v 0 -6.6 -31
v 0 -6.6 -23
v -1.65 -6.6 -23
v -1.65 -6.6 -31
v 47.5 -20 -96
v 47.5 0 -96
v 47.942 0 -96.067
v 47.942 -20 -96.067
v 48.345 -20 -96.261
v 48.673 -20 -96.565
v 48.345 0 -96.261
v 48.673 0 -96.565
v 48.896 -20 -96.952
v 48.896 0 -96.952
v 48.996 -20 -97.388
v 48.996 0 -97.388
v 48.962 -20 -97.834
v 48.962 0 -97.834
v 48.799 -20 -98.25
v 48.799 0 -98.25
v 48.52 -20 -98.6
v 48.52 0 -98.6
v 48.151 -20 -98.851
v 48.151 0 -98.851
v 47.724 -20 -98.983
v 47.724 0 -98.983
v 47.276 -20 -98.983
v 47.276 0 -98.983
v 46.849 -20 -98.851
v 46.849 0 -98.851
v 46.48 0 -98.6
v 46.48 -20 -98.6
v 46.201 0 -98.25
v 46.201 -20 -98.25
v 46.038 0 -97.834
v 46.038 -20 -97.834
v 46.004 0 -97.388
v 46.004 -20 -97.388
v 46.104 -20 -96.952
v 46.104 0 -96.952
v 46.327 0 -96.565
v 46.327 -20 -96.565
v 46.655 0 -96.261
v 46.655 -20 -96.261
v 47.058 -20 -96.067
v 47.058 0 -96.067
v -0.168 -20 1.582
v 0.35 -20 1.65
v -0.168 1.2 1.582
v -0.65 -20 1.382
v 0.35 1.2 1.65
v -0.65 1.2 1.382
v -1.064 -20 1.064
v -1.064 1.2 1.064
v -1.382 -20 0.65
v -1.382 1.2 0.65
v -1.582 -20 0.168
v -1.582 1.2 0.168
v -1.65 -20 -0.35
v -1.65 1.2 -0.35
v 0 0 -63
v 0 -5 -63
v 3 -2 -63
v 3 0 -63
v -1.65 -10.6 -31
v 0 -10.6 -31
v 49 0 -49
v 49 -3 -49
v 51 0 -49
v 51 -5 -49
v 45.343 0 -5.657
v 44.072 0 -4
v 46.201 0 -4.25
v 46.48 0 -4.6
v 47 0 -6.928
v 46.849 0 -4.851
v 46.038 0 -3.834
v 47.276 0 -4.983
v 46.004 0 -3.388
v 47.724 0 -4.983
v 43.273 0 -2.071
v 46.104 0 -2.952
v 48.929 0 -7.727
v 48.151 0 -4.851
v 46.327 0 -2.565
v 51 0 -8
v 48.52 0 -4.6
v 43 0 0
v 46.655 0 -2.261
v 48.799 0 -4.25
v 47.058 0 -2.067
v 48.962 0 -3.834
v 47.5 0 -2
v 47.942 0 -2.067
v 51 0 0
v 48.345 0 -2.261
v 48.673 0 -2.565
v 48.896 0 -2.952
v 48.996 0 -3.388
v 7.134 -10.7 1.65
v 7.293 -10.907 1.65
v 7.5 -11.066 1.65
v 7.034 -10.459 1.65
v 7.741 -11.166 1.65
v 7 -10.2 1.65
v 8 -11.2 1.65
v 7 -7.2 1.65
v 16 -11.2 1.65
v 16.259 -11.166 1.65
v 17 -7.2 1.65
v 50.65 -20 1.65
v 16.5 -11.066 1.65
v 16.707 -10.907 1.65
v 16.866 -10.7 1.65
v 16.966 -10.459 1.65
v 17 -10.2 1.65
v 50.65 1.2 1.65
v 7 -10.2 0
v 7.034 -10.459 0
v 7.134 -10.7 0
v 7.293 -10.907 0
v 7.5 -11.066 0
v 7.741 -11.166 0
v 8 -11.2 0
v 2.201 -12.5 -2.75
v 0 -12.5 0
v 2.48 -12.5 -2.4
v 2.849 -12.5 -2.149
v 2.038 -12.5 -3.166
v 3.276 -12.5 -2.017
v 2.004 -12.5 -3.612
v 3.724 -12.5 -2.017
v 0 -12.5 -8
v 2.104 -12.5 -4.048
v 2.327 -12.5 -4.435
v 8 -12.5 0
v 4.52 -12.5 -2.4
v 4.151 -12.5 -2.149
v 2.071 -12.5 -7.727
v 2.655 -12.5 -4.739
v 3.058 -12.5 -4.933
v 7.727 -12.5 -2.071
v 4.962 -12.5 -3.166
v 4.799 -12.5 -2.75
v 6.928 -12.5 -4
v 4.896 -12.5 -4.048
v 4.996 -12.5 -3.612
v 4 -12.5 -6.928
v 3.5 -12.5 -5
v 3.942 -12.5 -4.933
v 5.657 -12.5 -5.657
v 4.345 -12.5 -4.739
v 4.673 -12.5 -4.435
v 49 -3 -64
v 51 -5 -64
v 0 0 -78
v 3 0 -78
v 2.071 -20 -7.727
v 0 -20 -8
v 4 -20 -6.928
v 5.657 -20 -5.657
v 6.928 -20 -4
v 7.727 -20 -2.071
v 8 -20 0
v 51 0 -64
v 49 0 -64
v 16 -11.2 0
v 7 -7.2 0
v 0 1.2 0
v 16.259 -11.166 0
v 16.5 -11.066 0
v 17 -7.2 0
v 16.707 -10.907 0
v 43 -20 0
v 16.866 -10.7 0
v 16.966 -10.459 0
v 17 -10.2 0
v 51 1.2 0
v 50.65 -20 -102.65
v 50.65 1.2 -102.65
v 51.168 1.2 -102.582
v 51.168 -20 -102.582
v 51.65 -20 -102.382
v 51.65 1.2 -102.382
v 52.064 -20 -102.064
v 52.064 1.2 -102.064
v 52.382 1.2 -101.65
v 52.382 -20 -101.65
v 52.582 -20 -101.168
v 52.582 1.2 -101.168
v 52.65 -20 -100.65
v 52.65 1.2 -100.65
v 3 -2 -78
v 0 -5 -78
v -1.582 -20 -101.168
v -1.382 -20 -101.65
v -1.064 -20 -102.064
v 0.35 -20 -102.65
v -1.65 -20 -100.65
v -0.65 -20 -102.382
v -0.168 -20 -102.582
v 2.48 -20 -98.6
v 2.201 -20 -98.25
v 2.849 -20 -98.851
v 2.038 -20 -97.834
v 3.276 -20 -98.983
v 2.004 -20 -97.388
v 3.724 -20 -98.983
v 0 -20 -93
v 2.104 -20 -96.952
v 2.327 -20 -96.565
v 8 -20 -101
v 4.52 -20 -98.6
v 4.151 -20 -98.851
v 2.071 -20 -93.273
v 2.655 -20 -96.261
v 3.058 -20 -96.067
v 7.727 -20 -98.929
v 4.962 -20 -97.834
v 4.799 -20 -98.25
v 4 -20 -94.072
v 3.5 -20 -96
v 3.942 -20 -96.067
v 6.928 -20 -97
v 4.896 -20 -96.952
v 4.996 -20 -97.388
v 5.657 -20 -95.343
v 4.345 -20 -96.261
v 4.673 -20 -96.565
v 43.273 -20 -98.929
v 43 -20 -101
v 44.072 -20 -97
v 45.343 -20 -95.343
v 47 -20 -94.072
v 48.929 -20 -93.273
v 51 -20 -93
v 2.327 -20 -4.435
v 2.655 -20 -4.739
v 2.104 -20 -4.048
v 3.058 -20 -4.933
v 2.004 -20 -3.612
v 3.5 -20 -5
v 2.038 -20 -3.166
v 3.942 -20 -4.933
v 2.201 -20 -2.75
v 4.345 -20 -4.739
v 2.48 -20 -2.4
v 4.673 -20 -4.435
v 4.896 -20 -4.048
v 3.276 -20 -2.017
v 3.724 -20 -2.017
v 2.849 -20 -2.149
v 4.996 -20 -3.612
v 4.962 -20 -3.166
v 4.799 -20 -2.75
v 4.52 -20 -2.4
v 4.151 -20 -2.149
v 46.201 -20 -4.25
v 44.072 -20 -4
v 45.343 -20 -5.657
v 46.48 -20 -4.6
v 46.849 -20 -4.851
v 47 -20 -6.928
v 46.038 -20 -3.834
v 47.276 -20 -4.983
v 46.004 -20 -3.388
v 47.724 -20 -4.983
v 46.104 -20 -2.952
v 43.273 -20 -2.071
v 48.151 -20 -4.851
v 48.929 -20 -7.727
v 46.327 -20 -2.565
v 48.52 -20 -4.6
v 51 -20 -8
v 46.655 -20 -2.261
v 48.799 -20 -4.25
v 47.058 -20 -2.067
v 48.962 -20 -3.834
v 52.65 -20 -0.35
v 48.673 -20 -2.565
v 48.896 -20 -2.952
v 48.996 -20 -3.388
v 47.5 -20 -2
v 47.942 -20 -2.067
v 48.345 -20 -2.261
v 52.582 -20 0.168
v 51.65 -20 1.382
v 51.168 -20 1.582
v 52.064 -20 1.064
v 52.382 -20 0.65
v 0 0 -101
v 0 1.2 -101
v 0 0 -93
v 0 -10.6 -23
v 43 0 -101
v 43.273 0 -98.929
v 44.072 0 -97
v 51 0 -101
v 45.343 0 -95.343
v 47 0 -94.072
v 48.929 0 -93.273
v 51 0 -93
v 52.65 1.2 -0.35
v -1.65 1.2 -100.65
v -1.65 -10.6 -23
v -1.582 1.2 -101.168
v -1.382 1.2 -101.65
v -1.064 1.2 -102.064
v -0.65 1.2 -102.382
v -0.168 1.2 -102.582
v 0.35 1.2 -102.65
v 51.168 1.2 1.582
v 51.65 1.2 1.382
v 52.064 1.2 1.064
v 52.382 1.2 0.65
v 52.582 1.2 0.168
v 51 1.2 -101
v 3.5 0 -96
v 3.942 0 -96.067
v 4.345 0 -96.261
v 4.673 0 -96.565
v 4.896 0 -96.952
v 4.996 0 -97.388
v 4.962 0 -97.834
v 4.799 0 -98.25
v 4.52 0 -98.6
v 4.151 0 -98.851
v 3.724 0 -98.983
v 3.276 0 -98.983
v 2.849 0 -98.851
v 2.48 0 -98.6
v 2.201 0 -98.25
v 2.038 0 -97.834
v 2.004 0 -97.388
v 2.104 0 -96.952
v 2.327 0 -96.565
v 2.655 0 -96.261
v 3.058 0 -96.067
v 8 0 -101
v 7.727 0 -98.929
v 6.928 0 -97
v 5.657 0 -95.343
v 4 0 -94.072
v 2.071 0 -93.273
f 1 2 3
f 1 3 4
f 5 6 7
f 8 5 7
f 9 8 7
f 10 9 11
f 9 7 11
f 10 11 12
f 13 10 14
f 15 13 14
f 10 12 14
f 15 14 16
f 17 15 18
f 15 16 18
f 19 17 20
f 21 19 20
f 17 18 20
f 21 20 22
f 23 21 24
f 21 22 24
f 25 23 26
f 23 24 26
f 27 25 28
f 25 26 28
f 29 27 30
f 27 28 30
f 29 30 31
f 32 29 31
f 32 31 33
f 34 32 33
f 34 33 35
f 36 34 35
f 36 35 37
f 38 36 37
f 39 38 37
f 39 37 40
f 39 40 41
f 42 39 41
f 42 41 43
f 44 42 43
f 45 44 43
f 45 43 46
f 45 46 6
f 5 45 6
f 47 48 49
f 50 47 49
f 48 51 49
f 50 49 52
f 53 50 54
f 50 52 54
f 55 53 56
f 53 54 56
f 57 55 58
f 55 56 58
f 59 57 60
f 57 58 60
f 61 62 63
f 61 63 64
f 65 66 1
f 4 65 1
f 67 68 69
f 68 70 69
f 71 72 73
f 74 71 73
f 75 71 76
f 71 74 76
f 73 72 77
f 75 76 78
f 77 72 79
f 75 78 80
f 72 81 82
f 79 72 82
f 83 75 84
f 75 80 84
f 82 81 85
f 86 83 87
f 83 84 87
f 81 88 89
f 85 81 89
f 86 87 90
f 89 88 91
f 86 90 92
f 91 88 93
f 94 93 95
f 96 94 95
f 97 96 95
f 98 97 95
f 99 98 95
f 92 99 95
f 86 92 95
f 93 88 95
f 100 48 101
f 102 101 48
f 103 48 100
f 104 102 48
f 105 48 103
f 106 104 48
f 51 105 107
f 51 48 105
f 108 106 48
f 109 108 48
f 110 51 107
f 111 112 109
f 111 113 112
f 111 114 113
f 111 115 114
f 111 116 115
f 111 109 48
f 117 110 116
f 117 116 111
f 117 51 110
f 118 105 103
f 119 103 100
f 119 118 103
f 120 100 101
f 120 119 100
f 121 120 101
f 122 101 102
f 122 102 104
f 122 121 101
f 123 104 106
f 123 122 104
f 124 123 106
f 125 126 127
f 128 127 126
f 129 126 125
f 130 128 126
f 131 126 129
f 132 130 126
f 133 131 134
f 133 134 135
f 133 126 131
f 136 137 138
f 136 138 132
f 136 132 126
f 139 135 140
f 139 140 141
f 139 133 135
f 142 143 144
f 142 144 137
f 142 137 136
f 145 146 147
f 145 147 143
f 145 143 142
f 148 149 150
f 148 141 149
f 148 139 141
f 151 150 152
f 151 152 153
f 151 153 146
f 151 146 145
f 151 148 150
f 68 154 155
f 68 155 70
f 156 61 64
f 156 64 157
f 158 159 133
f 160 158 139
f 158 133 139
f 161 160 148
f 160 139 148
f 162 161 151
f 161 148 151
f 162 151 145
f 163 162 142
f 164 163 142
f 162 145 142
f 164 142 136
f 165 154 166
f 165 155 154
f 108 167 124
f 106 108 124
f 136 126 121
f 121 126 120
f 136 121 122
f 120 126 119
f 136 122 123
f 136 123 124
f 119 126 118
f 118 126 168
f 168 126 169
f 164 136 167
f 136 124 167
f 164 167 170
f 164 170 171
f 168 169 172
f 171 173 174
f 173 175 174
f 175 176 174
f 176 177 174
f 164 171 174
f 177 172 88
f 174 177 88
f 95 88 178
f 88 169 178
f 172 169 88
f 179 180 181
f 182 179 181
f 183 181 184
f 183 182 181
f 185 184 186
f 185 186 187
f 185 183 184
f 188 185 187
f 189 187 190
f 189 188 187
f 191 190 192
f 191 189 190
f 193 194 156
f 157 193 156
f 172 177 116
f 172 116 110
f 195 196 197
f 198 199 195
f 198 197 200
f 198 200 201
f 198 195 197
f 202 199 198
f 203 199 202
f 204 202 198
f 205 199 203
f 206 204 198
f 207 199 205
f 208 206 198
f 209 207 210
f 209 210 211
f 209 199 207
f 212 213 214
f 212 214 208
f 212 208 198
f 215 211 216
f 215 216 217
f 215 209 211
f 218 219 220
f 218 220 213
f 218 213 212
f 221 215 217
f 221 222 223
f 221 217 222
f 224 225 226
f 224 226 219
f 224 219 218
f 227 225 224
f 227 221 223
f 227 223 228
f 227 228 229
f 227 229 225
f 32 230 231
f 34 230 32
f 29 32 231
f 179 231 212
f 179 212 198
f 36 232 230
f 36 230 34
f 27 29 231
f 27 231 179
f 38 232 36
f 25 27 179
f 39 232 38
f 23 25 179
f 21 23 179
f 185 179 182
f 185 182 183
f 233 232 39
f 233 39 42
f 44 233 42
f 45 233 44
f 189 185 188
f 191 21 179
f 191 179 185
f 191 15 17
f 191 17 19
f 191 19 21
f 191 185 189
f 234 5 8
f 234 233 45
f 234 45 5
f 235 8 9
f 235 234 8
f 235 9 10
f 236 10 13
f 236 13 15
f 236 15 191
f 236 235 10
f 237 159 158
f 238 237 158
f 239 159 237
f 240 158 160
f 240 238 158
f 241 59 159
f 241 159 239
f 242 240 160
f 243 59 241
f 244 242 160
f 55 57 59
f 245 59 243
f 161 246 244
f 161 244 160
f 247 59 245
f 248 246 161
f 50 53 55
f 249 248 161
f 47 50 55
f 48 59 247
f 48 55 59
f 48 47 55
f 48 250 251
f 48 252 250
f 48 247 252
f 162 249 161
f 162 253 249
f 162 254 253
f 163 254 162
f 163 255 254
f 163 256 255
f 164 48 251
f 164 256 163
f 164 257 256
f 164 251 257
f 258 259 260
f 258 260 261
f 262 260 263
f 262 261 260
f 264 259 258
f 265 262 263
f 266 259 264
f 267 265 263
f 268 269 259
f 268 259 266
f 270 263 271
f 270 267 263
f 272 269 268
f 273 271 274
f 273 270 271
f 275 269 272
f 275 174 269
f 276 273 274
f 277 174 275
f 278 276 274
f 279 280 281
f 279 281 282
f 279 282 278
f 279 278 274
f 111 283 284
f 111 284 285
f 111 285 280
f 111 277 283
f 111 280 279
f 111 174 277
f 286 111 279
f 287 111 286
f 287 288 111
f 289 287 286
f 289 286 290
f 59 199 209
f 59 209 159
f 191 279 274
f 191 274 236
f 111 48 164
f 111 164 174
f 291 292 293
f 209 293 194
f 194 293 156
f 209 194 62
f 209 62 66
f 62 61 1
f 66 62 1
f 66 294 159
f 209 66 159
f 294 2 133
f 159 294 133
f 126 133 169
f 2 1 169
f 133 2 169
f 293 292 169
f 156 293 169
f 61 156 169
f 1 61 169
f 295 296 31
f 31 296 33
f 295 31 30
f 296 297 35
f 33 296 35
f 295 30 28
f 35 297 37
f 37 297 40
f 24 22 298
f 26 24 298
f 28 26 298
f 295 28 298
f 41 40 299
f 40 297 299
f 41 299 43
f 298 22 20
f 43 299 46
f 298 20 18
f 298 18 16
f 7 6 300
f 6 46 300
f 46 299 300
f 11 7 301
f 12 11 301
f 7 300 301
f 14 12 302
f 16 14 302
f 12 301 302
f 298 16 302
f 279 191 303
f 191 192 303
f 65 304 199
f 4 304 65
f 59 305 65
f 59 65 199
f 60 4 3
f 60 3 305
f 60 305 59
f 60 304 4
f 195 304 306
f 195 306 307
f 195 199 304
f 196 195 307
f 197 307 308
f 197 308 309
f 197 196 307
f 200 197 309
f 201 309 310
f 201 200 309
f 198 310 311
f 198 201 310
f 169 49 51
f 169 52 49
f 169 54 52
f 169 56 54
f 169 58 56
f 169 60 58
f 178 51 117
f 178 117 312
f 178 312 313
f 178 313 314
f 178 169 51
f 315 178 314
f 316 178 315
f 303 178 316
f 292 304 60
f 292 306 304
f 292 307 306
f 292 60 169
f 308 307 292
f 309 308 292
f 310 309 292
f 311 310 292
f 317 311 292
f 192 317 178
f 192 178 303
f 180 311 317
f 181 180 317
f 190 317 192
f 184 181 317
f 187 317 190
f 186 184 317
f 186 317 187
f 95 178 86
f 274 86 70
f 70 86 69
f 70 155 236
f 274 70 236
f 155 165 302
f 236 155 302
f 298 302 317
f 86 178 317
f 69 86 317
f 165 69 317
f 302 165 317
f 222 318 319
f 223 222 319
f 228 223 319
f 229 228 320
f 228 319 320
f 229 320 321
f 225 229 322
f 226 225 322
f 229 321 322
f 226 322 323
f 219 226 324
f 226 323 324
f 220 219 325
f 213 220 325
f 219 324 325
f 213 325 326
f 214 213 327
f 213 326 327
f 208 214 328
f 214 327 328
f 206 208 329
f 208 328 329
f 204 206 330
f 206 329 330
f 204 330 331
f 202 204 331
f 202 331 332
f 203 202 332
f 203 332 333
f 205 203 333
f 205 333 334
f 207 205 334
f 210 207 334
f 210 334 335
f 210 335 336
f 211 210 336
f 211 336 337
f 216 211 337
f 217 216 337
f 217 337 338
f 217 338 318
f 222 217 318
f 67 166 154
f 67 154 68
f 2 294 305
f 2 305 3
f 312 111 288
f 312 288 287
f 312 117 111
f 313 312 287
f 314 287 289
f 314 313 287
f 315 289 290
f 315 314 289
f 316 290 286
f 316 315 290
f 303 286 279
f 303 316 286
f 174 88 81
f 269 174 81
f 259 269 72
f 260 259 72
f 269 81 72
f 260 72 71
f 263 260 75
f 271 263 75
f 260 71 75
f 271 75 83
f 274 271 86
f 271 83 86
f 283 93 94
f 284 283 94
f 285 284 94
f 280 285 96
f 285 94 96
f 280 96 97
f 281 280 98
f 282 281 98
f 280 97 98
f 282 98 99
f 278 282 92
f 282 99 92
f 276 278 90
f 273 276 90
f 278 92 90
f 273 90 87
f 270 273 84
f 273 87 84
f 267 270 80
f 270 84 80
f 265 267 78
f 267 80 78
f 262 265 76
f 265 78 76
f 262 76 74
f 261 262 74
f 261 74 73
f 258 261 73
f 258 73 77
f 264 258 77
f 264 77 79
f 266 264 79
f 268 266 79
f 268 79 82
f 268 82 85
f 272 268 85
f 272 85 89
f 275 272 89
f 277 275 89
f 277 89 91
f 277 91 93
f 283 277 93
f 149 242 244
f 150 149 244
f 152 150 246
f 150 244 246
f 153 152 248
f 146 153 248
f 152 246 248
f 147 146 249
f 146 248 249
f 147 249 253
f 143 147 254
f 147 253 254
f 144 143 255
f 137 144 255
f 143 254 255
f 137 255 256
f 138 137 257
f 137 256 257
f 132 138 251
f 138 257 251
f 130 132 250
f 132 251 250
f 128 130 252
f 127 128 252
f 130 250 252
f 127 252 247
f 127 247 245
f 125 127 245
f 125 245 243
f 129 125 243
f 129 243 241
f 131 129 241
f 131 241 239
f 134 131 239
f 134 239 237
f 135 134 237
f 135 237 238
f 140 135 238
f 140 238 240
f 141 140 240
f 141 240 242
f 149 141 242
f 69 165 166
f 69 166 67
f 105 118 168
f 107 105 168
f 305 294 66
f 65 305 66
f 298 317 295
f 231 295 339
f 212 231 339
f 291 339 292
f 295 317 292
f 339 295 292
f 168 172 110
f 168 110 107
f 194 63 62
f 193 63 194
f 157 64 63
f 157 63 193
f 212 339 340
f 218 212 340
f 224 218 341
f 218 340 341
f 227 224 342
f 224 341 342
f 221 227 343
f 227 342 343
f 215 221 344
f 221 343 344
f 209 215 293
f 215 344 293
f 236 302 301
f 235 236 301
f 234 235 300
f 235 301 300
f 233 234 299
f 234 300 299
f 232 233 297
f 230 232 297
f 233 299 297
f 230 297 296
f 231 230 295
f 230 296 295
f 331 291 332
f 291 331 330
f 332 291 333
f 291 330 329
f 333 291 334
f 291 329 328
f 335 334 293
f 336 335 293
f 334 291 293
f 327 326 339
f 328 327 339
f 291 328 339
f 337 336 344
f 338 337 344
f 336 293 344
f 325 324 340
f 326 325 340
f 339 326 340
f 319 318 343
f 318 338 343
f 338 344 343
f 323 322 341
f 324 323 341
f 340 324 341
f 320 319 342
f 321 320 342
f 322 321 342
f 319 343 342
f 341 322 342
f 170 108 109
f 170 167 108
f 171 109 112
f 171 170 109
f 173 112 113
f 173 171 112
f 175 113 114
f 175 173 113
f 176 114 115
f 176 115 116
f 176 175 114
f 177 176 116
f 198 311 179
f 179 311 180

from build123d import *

# Parameters (mm, degrees)
SKICA1_W                 = 54.3
SKICA1_H                 = 104.3
SKICA1_W_2               = 51
SKICA1_H_2               = 101
P_IDAT_VYSUNUT_M1_DEPTH  = 1.2
SKICA2_W                 = 54.3
SKICA2_H                 = 104.3
P_IDAT_VYSUNUT_M2_DEPTH  = 20
SKICA3_R                 = 1.5
ODEBRAT_VYSUNUT_M1_DEPTH = 118.085631057
SKICA5_W                 = 8
SKICA5_H                 = 4
ODEBRAT_VYSUNUT_M2_DEPTH = 2
SKICA6_W                 = 10
SKICA6_H                 = 4
ODEBRAT_VYSUNUT_M3_DEPTH = 5
SKICA9_W                 = 15
SKICA9_H                 = 5
P_IDAT_VYSUNUT_M4_DEPTH  = 2
ZKOSEN_1_SIZE            = 2
SKICA10_W                = 15
SKICA10_H                = 5
P_IDAT_VYSUNUT_M5_DEPTH  = 3
ZKOSEN_2_SIZE            = 3
ZAOBLIT2_R               = 1
ZAOBLIT3_R               = 2
ODEBRAT_VYSUNUT_M5_DEPTH = 12.5
SKICA12_R                = 1.5
ODEBRAT_VYSUNUT_M6_DEPTH = 118.296568577


with BuildPart() as part:
    # Skica1 → Přidat vysunutím1 (new body)
    with BuildSketch(Plane(origin=(0, 0, 0), x_dir=(1, 0, 0), z_dir=(0, 1, 0))):
        with Locations((25.5, 50.5)):
            Rectangle(SKICA1_W, SKICA1_H)
        with Locations((25.5, 50.5)):
            Rectangle(SKICA1_W_2, SKICA1_H_2, mode=Mode.SUBTRACT)
    extrude(amount=P_IDAT_VYSUNUT_M1_DEPTH)

    # Skica2 → Přidat vysunutím2 (add)
    # profile 1 of 5: a face of its own
    with BuildSketch(Plane.XZ):
        with Locations((25.5, -50.5)):
            Rectangle(SKICA2_W, SKICA2_H)
        Polygon((0, -8), (0, 0), (8, 0), (43, 0), (51, 0), (51, -8), (51, -93), (51, -101), (43, -101), (8, -101), (0, -101), (0, -93), align=None, mode=Mode.SUBTRACT)
    # profile 2 of 5: a face of its own
    with BuildSketch(Plane.XZ):
        with BuildLine():
            Line((8, 0), (0, 0))
            Line((0, 0), (0, -8))
            ThreePointArc((0, -8), (5.656854249, -5.656854249), (8, 0))
        make_face()
    # profile 3 of 5: a face of its own
    with BuildSketch(Plane.XZ):
        with BuildLine():
            ThreePointArc((8, -101), (5.656854249, -95.343145751), (0, -93))
            Line((0, -93), (0, -101))
            Line((0, -101), (8, -101))
        make_face()
    # profile 4 of 5: a face of its own
    with BuildSketch(Plane.XZ):
        with BuildLine():
            Line((51, -101), (51, -93))
            ThreePointArc((51, -93), (45.343145751, -95.343145751), (43, -101))
            Line((43, -101), (51, -101))
        make_face()
    # profile 5 of 5: a face of its own
    with BuildSketch(Plane.XZ):
        with BuildLine():
            Line((51, 0), (43, 0))
            ThreePointArc((43, 0), (45.343145751, -5.656854249), (51, -8))
            Line((51, -8), (51, 0))
        make_face()
    extrude(amount=P_IDAT_VYSUNUT_M2_DEPTH)

    # Skica3 → Odebrat vysunutím1 (cut, through all)
    with BuildSketch(Plane(origin=(0, 0, 0), x_dir=(1, 0, 0), z_dir=(0, 1, 0))):
        with Locations(Location((3.5, 97.5, 0), (0, 0, 270))):
            Circle(SKICA3_R)
        with Locations(Location((47.5, 97.5, 0), (0, 0, 270))):
            Circle(SKICA3_R)
        with Locations(Location((47.5, 3.5, 0), (0, 0, 270))):
            Circle(SKICA3_R)
    extrude(amount=-ODEBRAT_VYSUNUT_M1_DEPTH, mode=Mode.SUBTRACT)

    # Skica5 → Odebrat vysunutím2 (cut)
    with BuildSketch(Plane(origin=(0, 0, 0), x_dir=(0, 0, -1), z_dir=(1, 0, 0))):
        with Locations((27, -8.6)):
            Rectangle(SKICA5_W, SKICA5_H)
    extrude(amount=-ODEBRAT_VYSUNUT_M2_DEPTH, mode=Mode.SUBTRACT)

    # Skica6 → Odebrat vysunutím3 (cut, symmetric)
    with BuildSketch(Plane(origin=(0, 0, 0), x_dir=(-1, 0, 0), z_dir=(0, 0, -1))):
        with Locations((-12, -9.2)):
            Rectangle(SKICA6_W, SKICA6_H)
    extrude(amount=ODEBRAT_VYSUNUT_M3_DEPTH, both=True, mode=Mode.SUBTRACT)

    # Skica9 → Přidat vysunutím4 (add)
    with BuildSketch(Plane.ZY.offset(-51)):
        with Locations((-56.5, -2.5)):
            Rectangle(SKICA9_W, SKICA9_H)
    extrude(amount=P_IDAT_VYSUNUT_M4_DEPTH)

    # Zkosení1
    zkosen_1_edges = [part.edges().sort_by_distance(p)[0] for p in [
        (49, -5, -56.5),
    ]]
    chamfer(zkosen_1_edges, length=ZKOSEN_1_SIZE - 0.0001)  # a hair under: the kernel refuses the full size

    # Skica10 → Přidat vysunutím5 (add)
    with BuildSketch(Plane(origin=(0, 0, 0), x_dir=(0, 0, -1), z_dir=(1, 0, 0))):
        with Locations((70.5, -2.5)):
            Rectangle(SKICA10_W, SKICA10_H)
    extrude(amount=P_IDAT_VYSUNUT_M5_DEPTH)

    # Zkosení2
    zkosen_2_edges = [part.edges().sort_by_distance(p)[0] for p in [
        (3, -5, -70.5),
    ]]
    chamfer(zkosen_2_edges, length=ZKOSEN_2_SIZE - 0.0001)  # a hair under: the kernel refuses the full size

    # Zaoblit2
    zaoblit2_edges = [part.edges().sort_by_distance(p)[0] for p in [
        (7, -11.2, -1.111491673),
        (17, -11.2, 0.825),
    ]]
    fillet(zaoblit2_edges, radius=ZAOBLIT2_R)

    # Zaoblit3
    zaoblit3_edges = [part.edges().sort_by_distance(p)[0] for p in [
        (-1.65, -9.4, -102.65),
        (52.65, -9.4, -102.65),
        (52.65, -9.4, 1.65),
        (-1.65, -9.4, 1.65),
    ]]
    fillet(zaoblit3_edges, radius=ZAOBLIT3_R)

    # Skica11 → Odebrat vysunutím5 (cut)
    with BuildSketch(Plane(origin=(0, 0, 0), x_dir=(1, 0, 0), z_dir=(0, 1, 0))):
        with BuildLine():
            Line((0, 8), (0, 0))
            Line((0, 0), (8, 0))
            ThreePointArc((8, 0), (5.656854249, 5.656854249), (0, 8))
        make_face()
    extrude(amount=-ODEBRAT_VYSUNUT_M5_DEPTH, mode=Mode.SUBTRACT)

    # Skica12 → Odebrat vysunutím6 (cut, through all)
    with BuildSketch(Plane.XZ.offset(20)):
        with Locations(Location((3.5, -3.5, 0), (0, 0, 270))):
            Circle(SKICA12_R)
    extrude(amount=-ODEBRAT_VYSUNUT_M6_DEPTH, mode=Mode.SUBTRACT)


solid = part.part
